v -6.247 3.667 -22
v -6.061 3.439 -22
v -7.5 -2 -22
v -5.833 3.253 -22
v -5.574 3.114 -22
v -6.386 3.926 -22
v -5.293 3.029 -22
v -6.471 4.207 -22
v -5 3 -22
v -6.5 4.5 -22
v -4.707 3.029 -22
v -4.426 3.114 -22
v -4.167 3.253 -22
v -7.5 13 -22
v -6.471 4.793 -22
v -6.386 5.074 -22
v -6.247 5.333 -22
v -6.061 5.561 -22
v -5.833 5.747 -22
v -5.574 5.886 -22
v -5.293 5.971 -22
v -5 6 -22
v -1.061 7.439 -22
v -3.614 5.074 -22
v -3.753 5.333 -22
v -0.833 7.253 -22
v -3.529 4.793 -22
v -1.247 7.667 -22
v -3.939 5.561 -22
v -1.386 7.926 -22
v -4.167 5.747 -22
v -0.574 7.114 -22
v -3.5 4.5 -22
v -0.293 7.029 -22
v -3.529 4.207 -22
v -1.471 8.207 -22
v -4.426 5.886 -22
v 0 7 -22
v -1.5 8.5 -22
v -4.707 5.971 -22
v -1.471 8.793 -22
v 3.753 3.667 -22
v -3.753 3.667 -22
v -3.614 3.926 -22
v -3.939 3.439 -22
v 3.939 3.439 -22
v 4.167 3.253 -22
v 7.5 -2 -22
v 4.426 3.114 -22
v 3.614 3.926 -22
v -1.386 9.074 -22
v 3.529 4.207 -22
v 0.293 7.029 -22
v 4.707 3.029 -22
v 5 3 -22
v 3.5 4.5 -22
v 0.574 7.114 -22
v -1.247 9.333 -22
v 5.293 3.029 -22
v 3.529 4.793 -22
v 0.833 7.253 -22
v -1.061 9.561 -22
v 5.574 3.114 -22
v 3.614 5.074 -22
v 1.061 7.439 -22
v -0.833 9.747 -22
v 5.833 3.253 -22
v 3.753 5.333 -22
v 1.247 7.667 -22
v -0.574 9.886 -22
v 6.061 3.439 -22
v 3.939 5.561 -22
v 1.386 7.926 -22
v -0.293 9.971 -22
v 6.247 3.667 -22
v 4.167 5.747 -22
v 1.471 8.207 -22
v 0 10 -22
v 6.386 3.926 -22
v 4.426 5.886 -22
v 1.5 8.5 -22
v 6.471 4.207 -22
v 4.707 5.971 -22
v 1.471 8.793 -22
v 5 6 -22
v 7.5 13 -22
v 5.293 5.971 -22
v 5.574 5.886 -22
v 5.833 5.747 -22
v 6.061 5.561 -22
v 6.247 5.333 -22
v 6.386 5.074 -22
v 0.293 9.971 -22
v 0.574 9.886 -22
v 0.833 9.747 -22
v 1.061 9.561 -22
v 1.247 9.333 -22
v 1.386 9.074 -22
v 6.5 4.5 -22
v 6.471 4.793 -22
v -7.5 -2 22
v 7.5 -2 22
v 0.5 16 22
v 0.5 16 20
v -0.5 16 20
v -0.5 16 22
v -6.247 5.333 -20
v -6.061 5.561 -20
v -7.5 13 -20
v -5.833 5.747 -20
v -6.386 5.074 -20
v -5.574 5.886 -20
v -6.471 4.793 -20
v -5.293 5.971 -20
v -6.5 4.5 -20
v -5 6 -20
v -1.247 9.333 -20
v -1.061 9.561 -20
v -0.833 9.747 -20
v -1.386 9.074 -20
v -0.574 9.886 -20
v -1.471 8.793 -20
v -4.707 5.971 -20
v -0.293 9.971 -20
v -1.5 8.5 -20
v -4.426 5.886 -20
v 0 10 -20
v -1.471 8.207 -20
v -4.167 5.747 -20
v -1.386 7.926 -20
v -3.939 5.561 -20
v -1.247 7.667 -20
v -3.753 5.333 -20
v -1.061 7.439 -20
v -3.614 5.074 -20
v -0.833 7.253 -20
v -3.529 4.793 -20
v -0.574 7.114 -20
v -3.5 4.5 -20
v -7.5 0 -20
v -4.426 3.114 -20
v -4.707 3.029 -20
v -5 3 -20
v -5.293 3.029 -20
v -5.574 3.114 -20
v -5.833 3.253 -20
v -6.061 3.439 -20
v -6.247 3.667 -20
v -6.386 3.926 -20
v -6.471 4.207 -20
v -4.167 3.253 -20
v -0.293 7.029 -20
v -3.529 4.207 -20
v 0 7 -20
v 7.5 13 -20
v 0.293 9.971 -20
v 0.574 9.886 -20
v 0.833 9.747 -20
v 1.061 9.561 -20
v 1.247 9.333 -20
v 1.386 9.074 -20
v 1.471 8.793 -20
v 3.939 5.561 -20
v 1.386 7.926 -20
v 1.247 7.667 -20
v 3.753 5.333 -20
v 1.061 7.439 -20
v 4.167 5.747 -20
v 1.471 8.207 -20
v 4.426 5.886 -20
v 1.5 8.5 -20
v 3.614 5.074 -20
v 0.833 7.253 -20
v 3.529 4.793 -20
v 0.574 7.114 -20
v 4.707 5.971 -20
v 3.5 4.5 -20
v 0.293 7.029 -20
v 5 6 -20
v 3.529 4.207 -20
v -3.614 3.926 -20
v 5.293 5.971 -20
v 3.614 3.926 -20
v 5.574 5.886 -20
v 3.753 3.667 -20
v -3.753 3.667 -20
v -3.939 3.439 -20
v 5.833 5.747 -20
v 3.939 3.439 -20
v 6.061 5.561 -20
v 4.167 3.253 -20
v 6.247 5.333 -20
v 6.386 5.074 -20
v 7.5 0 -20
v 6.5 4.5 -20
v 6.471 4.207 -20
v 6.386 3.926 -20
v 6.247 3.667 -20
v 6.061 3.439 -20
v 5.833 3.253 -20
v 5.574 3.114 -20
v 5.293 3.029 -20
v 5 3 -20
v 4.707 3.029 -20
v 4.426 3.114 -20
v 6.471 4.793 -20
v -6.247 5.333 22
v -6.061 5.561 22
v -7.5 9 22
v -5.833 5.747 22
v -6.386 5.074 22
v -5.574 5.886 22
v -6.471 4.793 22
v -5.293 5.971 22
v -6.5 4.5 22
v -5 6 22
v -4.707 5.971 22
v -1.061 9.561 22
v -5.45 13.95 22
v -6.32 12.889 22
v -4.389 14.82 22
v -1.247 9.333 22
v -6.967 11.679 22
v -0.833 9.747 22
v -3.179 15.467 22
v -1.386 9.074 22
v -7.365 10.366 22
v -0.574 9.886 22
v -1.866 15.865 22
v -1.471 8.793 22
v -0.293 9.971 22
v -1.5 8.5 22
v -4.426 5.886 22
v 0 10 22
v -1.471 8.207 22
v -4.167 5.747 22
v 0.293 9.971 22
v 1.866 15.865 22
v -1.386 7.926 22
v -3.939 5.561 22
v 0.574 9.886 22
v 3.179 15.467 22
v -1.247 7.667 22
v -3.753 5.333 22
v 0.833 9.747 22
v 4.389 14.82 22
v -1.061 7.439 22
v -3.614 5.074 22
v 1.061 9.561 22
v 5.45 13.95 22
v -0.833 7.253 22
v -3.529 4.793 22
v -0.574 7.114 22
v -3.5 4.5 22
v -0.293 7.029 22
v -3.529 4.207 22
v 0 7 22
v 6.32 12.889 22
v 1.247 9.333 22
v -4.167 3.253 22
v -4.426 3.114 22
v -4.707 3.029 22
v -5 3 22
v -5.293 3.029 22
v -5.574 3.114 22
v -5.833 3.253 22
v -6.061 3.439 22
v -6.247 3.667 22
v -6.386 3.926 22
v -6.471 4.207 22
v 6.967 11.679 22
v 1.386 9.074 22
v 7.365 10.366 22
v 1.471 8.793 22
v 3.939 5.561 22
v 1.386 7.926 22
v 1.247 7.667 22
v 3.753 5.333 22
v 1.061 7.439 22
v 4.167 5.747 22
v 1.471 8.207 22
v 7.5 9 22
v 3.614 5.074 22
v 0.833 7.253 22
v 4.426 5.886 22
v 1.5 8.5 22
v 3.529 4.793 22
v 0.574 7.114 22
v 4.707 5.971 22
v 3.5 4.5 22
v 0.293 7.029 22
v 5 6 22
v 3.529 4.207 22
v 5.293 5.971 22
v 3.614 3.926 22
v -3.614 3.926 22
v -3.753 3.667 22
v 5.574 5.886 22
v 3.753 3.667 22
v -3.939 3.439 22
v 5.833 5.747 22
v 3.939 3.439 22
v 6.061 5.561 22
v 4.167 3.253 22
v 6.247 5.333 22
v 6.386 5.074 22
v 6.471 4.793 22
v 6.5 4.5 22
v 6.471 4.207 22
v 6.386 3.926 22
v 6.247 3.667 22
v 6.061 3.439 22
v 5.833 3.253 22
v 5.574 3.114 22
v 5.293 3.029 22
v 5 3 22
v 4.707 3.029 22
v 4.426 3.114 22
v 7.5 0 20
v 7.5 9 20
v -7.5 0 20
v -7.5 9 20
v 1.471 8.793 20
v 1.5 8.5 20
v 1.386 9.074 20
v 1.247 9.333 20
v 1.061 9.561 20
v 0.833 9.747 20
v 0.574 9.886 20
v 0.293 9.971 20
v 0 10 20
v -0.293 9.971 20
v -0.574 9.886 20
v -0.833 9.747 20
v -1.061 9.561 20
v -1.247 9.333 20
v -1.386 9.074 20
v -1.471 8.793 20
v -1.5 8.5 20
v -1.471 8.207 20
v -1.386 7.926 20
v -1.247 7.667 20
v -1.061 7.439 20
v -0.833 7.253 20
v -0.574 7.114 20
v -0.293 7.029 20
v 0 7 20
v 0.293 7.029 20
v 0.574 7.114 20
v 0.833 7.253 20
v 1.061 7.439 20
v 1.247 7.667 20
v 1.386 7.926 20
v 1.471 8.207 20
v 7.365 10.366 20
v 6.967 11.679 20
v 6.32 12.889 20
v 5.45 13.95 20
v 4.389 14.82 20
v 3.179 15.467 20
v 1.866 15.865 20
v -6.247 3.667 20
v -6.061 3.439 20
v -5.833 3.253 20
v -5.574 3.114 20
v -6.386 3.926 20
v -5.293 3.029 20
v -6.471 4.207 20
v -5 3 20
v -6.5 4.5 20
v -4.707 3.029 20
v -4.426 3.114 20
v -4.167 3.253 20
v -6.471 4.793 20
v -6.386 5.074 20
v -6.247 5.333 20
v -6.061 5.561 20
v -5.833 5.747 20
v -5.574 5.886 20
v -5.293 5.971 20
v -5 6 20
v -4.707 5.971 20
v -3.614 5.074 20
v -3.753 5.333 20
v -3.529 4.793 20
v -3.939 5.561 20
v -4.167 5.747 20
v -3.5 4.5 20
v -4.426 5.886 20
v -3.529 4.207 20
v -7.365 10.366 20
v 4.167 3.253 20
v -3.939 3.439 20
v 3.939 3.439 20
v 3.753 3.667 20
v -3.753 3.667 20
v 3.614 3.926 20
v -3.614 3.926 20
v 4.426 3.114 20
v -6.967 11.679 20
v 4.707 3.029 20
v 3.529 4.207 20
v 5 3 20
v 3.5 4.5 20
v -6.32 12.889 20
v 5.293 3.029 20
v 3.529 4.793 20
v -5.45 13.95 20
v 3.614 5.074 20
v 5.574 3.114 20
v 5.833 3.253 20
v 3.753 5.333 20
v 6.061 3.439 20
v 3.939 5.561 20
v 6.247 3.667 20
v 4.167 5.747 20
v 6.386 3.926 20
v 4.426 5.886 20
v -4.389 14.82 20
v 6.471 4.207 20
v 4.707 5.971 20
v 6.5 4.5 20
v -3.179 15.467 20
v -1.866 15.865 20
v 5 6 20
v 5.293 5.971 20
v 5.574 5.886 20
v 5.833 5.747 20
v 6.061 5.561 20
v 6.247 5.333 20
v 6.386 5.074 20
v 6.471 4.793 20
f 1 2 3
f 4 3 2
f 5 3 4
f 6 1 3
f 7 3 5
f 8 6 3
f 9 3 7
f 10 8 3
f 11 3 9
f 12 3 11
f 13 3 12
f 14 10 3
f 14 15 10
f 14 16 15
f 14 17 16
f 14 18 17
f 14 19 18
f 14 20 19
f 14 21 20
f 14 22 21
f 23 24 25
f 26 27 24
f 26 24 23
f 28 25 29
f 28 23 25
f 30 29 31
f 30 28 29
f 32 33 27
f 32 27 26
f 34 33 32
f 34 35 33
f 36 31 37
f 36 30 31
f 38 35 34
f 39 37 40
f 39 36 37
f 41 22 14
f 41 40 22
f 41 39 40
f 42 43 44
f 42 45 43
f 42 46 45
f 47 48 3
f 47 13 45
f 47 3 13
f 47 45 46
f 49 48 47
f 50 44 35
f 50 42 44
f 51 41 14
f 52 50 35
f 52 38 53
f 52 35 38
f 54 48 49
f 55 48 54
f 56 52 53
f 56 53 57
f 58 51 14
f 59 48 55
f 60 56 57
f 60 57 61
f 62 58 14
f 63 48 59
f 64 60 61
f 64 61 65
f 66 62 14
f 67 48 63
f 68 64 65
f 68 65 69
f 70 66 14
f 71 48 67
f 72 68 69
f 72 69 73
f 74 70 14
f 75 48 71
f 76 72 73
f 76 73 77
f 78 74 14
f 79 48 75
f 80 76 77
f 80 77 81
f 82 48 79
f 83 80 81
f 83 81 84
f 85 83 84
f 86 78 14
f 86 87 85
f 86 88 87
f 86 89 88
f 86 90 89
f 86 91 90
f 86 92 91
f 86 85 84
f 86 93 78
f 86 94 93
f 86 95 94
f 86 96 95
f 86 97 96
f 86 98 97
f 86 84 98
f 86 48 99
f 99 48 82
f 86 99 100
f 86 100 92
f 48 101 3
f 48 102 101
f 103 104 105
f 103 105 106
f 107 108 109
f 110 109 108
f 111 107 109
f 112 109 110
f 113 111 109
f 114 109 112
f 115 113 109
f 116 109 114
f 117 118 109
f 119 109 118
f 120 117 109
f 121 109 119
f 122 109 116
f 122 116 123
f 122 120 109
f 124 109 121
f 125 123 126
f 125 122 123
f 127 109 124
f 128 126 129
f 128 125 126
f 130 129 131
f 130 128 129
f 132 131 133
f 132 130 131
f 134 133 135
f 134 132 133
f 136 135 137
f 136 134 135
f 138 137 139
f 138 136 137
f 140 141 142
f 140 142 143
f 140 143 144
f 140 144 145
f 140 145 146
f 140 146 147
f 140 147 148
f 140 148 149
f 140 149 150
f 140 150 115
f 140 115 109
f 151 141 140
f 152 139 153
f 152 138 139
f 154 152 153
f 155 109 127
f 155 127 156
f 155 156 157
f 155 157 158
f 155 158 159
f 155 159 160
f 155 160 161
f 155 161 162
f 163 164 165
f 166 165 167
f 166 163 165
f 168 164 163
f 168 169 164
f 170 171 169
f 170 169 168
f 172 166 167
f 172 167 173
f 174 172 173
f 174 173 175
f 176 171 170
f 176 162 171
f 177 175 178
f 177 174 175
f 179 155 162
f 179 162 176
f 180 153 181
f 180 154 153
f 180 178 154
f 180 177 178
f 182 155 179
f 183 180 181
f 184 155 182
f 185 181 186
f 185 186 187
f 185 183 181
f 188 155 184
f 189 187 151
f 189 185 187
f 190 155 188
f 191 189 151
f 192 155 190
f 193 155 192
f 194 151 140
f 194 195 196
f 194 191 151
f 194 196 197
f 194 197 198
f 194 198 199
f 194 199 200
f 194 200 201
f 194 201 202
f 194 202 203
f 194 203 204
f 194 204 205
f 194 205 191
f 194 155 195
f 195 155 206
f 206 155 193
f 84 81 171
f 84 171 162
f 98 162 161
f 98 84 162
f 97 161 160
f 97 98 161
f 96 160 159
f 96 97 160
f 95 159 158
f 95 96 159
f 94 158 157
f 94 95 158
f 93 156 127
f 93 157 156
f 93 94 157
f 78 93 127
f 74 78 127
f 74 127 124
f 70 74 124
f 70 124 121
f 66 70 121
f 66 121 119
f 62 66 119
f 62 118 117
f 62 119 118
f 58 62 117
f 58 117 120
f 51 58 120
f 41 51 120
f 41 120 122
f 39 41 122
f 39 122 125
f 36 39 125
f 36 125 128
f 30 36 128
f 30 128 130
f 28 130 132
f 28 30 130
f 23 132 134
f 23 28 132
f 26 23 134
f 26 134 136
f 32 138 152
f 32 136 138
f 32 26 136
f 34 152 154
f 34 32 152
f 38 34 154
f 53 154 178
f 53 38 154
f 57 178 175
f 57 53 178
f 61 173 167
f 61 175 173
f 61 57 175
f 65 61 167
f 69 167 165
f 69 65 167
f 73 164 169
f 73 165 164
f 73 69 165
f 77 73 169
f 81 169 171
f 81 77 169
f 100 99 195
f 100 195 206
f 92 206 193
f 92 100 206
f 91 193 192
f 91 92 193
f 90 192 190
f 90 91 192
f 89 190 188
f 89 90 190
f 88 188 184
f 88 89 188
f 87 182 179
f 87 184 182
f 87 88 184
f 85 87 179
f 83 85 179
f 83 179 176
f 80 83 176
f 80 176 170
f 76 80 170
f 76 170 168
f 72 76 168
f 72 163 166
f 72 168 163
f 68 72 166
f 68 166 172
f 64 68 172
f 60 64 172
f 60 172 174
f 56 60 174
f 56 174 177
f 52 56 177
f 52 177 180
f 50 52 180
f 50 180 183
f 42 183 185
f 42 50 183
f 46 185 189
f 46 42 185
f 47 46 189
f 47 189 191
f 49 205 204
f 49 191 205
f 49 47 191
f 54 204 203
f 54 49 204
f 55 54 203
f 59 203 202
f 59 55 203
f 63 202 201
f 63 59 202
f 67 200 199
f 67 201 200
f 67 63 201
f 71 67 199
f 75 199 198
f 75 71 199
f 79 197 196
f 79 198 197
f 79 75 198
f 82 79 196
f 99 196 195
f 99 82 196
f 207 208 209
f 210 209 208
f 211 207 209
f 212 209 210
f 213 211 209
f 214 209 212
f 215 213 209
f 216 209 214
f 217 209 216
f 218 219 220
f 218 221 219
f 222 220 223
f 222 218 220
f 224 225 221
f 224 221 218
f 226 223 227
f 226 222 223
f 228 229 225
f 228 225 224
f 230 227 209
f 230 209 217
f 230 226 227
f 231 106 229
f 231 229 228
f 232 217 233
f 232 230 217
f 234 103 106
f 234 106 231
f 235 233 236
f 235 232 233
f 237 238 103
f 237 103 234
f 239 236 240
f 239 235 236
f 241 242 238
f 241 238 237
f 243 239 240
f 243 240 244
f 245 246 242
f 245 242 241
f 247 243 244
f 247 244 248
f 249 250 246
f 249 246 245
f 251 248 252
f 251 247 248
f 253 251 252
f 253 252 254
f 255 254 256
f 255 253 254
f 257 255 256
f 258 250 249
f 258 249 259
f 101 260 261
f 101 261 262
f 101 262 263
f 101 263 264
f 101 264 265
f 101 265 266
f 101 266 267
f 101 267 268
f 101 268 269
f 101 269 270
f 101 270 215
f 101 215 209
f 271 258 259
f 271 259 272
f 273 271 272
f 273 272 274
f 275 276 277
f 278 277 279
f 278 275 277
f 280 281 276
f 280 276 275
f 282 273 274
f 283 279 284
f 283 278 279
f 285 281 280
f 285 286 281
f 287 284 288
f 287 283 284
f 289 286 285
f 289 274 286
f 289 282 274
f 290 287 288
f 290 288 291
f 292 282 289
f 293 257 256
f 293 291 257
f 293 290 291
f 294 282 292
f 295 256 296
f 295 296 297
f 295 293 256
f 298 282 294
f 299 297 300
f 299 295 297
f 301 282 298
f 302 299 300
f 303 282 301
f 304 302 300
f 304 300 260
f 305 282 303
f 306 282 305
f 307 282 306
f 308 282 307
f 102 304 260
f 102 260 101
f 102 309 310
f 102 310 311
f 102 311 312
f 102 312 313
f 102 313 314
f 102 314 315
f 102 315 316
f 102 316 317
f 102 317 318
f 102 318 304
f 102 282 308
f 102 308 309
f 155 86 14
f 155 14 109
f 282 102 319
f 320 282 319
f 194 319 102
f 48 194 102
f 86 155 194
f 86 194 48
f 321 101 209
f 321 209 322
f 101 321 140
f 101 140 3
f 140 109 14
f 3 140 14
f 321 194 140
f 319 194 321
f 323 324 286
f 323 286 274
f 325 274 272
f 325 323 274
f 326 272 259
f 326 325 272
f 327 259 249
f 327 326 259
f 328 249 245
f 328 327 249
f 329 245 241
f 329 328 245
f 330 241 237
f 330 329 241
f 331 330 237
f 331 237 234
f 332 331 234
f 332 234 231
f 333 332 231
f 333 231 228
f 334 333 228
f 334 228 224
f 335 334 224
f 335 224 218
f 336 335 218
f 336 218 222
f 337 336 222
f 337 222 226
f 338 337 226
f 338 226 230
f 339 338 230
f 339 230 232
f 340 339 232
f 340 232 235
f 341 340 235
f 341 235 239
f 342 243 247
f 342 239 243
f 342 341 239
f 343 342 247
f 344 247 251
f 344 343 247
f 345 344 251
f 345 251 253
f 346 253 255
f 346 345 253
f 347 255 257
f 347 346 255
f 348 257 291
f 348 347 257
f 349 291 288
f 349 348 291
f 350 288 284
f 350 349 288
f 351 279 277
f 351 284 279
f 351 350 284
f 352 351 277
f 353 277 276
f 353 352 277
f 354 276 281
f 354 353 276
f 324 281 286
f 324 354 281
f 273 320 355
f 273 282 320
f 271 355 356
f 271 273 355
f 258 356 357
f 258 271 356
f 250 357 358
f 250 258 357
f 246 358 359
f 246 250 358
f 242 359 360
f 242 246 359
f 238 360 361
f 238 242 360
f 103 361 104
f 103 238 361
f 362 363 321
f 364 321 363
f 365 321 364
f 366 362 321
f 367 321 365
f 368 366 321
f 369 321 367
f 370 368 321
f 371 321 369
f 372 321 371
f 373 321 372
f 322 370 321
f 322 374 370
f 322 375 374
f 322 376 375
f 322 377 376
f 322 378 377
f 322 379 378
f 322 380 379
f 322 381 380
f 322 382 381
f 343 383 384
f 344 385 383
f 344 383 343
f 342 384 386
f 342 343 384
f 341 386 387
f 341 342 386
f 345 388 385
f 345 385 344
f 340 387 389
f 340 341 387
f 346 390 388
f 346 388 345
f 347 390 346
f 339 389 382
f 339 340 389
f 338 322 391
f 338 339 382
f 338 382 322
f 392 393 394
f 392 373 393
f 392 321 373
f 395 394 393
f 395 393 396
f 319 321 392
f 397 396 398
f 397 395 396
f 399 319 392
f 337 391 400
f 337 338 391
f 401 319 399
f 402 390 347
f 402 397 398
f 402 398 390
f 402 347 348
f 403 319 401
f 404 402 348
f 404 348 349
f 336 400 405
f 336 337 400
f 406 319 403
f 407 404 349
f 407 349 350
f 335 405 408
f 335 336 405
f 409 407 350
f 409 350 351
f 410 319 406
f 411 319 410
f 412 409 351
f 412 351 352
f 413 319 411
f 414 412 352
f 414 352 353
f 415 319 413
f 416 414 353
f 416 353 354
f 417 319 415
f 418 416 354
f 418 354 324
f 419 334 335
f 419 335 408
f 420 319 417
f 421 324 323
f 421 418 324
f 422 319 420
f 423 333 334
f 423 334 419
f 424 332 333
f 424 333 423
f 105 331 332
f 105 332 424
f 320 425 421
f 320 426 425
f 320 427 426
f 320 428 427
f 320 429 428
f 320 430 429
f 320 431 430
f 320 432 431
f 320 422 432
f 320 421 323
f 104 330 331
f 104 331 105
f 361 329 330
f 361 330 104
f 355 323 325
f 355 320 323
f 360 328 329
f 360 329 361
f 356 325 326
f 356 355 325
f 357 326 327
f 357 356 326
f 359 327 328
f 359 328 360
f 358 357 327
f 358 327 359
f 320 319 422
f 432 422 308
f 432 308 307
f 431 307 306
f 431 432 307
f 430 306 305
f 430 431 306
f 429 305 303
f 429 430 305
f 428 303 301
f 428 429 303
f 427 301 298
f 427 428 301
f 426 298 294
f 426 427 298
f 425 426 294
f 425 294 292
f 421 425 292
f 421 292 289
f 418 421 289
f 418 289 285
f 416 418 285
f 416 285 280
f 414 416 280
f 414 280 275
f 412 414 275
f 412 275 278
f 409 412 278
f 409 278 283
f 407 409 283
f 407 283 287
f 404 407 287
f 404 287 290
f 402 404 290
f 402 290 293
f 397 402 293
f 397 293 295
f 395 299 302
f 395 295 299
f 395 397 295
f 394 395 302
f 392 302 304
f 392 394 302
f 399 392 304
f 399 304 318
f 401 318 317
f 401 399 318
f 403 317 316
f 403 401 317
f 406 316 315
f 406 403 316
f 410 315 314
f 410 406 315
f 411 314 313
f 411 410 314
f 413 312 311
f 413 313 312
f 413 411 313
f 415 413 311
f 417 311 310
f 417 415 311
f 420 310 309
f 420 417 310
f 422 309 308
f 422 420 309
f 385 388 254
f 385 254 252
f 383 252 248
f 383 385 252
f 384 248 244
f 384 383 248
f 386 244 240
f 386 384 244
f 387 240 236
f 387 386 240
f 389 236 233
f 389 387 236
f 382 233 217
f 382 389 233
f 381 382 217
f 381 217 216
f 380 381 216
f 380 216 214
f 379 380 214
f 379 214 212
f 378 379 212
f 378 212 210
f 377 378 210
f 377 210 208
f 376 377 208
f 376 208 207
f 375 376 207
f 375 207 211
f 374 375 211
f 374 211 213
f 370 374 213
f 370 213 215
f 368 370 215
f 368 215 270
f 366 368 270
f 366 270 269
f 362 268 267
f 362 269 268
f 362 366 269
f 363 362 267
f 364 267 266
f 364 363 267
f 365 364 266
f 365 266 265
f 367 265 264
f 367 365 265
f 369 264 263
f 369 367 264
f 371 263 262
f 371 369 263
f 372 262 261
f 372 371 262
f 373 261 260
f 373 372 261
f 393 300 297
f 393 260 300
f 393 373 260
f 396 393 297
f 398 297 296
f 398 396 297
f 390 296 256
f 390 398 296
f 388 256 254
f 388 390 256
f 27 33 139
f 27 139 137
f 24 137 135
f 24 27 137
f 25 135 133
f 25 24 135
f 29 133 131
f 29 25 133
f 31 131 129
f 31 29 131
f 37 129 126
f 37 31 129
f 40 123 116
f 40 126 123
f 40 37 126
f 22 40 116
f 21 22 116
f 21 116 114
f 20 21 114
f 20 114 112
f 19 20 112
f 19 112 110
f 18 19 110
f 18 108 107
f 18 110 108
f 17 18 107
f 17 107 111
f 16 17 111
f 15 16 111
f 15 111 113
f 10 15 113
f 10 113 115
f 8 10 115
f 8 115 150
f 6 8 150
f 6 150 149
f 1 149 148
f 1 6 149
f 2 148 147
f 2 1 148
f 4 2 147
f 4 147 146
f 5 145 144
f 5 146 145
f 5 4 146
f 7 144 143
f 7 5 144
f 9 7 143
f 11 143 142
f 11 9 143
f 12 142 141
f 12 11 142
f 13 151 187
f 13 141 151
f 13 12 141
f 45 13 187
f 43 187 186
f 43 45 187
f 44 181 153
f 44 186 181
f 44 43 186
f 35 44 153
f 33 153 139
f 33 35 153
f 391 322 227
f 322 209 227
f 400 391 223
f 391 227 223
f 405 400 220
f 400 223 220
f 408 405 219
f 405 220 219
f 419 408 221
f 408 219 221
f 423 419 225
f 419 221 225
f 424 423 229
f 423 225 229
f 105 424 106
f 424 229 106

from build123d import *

# Parameters (mm, degrees)
SALIENTE_EXTRUIR1_DEPTH    = 7.5
CORTAR_EXTRUIR1_DEPTH      = 29.217902119
CORTAR_EXTRUIR1_DEPTH_BACK = 29.217902119
CROQUIS2_R                 = 1.5
REDONDEO1_R                = 7


with BuildPart() as part:
    # Croquis1 → Saliente-Extruir1 (new, symmetric)
    with BuildSketch(Plane(origin=(0, 0, 0), x_dir=(0, 0, -1), z_dir=(1, 0, 0))):
        Polygon((-22, 13), (-22, -2), (22, -2), (22, 13), (20, 13), (20, 0), (-20, 0), (-20, 13), (-20, 16), (-22, 16), align=None)
    extrude(amount=SALIENTE_EXTRUIR1_DEPTH, both=True)

    # Croquis2 → Cortar-Extruir1 (cut, two sides: drawn at the far end of the back side and taken through both)
    with BuildSketch(Plane.XY.offset(-CORTAR_EXTRUIR1_DEPTH_BACK)):
        with Locations((0, 8.5)):
            Circle(CROQUIS2_R)
        with Locations((5, 4.5)):
            Circle(CROQUIS2_R)
        with Locations((-5, 4.5)):
            Circle(CROQUIS2_R)
    extrude(amount=CORTAR_EXTRUIR1_DEPTH + CORTAR_EXTRUIR1_DEPTH_BACK, mode=Mode.SUBTRACT)

    # Redondeo1
    redondeo1_edges = [part.edges().sort_by_distance(p)[0] for p in [
        (-7.5, 16, 21),
        (7.5, 16, 21),
    ]]
    fillet(redondeo1_edges, radius=REDONDEO1_R)


solid = part.part
